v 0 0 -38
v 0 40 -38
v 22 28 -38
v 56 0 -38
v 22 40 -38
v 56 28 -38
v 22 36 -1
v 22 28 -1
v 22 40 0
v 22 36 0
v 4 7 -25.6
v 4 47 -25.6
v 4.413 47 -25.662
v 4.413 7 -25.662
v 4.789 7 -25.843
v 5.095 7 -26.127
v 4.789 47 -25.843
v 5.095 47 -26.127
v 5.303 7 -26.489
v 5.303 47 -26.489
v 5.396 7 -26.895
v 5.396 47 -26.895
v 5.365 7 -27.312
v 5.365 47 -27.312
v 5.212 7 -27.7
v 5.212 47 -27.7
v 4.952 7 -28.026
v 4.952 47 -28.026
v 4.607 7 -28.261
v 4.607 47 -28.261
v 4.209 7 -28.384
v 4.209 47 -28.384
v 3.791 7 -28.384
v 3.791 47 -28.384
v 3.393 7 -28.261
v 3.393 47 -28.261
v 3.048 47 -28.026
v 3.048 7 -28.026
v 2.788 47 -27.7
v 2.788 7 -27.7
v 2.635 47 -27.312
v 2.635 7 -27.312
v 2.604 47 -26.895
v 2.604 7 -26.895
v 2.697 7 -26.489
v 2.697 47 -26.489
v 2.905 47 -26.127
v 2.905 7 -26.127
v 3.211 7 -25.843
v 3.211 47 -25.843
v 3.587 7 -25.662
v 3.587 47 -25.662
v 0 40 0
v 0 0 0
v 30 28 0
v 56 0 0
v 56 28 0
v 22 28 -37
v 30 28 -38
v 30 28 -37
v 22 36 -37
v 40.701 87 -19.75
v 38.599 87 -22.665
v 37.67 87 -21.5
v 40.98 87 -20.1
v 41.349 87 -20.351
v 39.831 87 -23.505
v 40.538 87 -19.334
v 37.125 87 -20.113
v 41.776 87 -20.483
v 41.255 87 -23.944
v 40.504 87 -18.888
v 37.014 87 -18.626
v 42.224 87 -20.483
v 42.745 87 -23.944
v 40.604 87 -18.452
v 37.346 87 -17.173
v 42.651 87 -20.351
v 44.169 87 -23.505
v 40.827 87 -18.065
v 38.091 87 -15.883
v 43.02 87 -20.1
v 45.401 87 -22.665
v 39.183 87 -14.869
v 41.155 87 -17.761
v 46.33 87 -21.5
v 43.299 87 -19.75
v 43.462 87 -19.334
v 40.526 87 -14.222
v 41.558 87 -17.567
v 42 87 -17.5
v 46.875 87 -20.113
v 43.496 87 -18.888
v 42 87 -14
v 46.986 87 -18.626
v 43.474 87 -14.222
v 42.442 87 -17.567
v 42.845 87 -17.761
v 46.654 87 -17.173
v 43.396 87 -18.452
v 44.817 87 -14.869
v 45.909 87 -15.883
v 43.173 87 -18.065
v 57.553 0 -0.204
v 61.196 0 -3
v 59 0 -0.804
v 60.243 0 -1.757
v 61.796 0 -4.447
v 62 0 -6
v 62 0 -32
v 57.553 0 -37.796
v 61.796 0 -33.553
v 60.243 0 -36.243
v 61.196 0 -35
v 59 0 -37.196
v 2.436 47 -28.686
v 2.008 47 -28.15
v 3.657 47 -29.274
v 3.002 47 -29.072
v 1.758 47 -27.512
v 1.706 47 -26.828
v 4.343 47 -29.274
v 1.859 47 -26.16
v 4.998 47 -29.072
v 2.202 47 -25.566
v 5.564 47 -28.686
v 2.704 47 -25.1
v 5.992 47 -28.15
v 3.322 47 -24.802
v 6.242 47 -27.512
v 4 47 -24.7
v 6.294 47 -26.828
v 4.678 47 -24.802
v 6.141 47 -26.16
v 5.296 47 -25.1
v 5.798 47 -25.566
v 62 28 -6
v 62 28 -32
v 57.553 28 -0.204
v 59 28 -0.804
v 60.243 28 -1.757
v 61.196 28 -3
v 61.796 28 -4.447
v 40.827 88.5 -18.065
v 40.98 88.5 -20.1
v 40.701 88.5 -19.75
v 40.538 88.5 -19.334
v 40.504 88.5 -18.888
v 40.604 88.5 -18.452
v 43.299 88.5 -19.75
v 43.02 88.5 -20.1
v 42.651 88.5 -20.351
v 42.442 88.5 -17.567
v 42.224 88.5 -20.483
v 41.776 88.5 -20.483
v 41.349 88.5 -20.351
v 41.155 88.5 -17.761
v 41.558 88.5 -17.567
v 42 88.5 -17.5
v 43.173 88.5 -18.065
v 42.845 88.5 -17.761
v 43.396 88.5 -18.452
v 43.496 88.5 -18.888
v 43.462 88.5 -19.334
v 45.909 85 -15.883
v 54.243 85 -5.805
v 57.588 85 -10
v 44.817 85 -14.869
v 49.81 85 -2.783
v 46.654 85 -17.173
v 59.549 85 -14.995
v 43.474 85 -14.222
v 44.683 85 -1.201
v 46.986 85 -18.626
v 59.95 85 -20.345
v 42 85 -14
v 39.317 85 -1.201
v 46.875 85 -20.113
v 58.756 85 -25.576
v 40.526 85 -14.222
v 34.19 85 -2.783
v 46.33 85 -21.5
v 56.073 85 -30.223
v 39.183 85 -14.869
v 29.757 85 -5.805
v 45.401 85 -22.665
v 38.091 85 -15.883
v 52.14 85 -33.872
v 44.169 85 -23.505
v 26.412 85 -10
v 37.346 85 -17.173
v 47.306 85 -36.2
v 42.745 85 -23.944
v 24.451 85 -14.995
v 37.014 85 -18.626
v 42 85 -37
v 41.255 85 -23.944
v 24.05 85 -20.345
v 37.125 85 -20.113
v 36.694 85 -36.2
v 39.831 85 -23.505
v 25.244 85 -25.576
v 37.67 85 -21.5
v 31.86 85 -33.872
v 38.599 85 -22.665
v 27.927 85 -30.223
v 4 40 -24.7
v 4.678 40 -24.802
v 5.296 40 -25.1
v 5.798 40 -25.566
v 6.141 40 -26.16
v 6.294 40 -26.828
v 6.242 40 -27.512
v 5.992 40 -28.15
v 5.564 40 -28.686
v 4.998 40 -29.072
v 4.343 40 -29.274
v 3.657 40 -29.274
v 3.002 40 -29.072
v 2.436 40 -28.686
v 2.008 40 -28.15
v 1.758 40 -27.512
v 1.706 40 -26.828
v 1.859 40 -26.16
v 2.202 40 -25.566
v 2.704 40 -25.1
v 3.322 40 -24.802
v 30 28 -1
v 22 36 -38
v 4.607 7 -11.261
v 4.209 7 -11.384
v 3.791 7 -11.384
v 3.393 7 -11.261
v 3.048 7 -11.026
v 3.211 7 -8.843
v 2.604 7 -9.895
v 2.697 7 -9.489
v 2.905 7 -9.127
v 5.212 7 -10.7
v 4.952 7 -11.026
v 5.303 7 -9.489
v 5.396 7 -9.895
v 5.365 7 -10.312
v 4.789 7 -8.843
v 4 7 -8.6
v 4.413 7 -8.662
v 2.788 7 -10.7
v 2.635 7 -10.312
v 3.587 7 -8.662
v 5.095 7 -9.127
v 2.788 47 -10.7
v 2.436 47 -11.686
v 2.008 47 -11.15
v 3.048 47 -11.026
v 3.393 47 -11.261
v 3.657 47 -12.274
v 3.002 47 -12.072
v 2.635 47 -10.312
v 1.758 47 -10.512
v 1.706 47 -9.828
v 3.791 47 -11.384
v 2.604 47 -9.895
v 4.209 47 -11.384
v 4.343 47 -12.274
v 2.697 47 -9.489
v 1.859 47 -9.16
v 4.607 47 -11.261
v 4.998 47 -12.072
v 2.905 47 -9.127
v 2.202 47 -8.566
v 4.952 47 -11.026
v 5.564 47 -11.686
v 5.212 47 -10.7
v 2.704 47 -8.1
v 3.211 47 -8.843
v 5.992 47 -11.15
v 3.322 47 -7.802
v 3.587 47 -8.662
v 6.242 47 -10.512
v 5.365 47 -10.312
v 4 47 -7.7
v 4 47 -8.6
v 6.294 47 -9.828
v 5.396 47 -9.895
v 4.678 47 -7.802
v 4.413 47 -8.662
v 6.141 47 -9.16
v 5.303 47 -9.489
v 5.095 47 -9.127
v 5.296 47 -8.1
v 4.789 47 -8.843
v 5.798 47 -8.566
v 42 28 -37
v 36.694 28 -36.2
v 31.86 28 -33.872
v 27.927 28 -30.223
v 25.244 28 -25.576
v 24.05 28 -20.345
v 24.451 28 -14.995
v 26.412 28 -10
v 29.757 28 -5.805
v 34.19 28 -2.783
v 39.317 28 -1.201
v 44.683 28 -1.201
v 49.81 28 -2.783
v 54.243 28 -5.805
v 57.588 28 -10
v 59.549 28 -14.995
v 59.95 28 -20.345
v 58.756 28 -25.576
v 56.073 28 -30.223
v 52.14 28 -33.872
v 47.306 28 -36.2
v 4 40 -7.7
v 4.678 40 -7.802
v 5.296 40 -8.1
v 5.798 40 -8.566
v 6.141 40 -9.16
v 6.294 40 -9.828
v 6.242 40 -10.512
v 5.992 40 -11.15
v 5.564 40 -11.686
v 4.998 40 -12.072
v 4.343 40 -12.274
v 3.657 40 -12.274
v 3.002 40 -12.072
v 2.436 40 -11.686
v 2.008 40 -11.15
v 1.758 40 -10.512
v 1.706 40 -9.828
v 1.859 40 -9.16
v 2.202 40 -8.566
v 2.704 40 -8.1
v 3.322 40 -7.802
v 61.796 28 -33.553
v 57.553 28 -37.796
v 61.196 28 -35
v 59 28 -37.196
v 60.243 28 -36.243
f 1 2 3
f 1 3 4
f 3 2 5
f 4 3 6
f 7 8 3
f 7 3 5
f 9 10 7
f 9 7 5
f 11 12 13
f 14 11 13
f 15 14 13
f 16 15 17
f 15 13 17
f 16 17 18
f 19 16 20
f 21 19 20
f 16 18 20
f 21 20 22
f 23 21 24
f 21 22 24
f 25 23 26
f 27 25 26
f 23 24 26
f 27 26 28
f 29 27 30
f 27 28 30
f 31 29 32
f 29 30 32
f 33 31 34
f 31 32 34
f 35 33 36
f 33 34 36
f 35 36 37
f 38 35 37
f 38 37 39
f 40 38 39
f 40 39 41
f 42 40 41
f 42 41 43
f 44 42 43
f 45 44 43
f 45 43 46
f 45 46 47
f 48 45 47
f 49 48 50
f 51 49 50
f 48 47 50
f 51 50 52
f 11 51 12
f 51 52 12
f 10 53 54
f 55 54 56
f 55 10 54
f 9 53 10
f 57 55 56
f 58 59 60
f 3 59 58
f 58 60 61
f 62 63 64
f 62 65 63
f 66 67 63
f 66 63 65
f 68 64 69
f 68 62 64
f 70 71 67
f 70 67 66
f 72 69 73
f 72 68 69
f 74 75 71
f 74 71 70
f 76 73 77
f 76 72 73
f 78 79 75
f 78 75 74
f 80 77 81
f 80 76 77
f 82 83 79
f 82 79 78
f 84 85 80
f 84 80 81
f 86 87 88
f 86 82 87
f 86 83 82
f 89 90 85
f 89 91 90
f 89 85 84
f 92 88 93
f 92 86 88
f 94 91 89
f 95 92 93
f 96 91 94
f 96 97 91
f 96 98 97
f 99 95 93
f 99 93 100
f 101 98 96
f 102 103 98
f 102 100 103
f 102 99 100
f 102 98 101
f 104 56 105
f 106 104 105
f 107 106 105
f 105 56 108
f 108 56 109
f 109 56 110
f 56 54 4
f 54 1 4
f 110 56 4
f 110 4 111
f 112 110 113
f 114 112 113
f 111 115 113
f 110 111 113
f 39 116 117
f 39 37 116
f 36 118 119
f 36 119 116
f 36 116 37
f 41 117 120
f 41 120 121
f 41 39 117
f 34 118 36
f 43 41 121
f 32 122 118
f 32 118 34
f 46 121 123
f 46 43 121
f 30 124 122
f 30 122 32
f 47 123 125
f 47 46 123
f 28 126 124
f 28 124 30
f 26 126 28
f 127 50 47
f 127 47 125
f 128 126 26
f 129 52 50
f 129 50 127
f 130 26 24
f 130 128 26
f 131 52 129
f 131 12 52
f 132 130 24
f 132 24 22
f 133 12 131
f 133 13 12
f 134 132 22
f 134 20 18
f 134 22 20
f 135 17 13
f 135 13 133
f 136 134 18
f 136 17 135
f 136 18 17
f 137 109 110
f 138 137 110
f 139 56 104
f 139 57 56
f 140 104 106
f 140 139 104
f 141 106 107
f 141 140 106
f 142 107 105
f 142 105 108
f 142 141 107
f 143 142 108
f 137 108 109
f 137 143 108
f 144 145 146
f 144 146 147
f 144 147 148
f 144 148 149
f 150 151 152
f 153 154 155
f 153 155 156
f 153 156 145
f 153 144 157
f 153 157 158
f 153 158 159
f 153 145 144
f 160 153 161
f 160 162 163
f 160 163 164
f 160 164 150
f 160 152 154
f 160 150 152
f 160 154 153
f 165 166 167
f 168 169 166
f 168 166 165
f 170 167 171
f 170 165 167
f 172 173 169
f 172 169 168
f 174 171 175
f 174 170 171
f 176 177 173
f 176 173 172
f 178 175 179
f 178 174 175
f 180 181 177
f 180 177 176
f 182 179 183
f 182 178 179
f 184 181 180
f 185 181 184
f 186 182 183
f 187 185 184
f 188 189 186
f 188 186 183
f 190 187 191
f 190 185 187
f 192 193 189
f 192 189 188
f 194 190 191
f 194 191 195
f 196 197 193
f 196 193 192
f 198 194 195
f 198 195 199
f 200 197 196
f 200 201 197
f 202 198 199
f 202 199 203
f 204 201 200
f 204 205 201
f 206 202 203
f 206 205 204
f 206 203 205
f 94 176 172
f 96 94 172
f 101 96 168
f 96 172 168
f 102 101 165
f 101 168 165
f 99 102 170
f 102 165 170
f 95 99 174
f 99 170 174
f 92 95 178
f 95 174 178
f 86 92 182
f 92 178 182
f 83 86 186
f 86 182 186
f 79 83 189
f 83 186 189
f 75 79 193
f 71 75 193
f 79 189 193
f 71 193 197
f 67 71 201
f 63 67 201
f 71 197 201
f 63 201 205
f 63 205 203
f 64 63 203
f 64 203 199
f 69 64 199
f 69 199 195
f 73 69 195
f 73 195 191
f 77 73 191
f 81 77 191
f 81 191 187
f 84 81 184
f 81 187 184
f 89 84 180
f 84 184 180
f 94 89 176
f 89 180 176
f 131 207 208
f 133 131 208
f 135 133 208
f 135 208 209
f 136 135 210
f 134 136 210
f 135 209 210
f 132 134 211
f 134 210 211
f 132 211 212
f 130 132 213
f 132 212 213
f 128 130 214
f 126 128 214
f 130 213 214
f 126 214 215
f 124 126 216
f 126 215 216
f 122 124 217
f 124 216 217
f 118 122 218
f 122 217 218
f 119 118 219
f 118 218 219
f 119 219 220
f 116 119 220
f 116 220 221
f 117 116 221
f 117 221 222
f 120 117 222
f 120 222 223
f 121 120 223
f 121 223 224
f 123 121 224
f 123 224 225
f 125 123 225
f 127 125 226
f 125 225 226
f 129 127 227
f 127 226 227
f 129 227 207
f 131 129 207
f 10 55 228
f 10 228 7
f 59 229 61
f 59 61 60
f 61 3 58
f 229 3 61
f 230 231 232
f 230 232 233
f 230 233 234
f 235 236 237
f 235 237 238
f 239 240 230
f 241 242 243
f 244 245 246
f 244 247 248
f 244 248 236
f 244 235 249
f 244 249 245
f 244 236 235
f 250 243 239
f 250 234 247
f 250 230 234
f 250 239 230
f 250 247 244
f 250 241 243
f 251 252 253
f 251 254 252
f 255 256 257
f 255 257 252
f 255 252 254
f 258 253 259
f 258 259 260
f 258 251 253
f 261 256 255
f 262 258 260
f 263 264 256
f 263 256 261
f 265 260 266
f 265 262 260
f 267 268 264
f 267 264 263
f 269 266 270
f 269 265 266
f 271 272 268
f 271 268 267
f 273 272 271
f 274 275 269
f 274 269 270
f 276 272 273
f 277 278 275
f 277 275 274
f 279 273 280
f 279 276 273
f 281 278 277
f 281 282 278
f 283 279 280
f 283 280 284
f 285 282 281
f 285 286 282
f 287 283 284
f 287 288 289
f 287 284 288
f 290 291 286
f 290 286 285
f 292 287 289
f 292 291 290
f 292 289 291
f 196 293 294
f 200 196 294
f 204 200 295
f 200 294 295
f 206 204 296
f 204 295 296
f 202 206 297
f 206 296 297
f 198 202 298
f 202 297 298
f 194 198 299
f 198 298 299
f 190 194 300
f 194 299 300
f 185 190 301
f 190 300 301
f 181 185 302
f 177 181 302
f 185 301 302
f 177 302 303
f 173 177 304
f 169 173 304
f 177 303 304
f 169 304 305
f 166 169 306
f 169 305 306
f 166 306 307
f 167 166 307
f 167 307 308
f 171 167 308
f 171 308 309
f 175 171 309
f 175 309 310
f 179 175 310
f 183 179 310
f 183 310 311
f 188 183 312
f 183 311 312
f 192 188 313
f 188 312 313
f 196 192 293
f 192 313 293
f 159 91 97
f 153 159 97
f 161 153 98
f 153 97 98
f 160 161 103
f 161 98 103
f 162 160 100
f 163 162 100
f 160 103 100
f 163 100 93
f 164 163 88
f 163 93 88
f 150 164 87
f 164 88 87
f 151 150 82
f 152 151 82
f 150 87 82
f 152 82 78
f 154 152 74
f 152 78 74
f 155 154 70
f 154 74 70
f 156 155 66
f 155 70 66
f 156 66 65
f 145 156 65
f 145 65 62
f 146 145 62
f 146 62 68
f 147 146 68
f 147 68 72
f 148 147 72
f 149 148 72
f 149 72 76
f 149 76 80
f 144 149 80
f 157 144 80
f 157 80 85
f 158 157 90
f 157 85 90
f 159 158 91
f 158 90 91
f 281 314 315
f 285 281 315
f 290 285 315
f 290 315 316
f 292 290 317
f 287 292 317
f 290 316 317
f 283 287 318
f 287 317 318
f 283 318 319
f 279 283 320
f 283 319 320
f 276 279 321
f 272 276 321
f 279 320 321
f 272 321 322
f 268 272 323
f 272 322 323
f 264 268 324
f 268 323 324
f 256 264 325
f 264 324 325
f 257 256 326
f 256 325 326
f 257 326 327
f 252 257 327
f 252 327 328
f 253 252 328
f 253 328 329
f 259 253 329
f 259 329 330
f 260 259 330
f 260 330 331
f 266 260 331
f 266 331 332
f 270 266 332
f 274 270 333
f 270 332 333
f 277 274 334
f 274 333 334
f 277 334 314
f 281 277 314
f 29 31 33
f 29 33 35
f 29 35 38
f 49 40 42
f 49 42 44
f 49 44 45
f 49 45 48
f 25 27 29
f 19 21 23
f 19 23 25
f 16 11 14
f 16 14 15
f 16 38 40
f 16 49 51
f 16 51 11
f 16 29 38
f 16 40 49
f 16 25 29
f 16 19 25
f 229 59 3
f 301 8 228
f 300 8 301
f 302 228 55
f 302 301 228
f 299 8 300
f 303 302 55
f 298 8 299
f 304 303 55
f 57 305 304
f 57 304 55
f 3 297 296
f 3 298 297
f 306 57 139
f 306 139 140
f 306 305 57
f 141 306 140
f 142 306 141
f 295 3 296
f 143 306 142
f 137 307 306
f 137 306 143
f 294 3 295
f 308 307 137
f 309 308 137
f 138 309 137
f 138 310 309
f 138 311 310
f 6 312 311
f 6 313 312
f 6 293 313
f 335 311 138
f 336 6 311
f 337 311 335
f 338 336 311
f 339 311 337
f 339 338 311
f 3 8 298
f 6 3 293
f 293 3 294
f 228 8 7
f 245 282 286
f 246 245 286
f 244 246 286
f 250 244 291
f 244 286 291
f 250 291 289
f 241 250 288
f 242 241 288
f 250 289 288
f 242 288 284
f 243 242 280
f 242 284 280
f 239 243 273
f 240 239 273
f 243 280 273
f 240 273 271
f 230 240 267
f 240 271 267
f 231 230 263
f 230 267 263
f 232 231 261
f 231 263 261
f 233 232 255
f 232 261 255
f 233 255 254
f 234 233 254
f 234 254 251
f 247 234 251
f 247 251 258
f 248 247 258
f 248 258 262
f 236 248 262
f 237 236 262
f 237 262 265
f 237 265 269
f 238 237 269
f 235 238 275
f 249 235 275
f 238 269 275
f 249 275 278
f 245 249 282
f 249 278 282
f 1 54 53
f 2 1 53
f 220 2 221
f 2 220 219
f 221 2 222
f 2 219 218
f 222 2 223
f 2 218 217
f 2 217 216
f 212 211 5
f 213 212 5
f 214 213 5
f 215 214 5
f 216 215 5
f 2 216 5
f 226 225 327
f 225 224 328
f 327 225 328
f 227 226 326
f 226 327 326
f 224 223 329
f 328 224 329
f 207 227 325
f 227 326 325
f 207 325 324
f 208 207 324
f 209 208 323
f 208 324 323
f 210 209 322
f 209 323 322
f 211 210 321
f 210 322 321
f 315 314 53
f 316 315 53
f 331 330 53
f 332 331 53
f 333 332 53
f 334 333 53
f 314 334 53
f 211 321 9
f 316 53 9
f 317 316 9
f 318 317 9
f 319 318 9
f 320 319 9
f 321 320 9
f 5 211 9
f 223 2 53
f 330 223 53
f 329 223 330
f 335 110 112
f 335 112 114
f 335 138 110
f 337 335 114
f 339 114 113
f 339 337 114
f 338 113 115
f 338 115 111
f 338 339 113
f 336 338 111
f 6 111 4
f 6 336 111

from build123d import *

# Parameters (mm, degrees)
ESQUISSE1_W             = 62
ESQUISSE1_H             = 38
BOSS_EXTRU_1_DEPTH      = 28
CONG_1_R                = 6
ESQUISSE3_W             = 22
ESQUISSE3_H             = 12
BOSS_EXTRU_2_DEPTH      = 38
ESQUISSE4_R             = 2.3
BOSS_EXTRU_3_DEPTH      = 7
ESQUISSE5_R             = 1.4
ENL_V_MAT_EXTRU_1_DEPTH = 40
ESQUISSE6_R             = 18
BOSS_EXTRU_4_DEPTH      = 57
ESQUISSE7_R             = 5
BOSS_EXTRU_5_DEPTH      = 2
BOSS_EXTRU_6_DEPTH      = 1
BOSS_EXTRU_7_DEPTH      = 1
ESQUISSE10_R            = 1.5
BOSS_EXTRU_8_DEPTH      = 1.5


with BuildPart() as part:
    # Esquisse1 → Boss.-Extru.1 (new body)
    with BuildSketch(Plane(origin=(0, 0, 0), x_dir=(1, 0, 0), z_dir=(0, 1, 0))):
        with Locations((31, 19)):
            Rectangle(ESQUISSE1_W, ESQUISSE1_H)
    extrude(amount=BOSS_EXTRU_1_DEPTH)

    # Congé1
    cong_1_edges = [part.edges().sort_by_distance(p)[0] for p in [
        (62, 14, -38),
        (62, 14, 0),
    ]]
    fillet(cong_1_edges, radius=CONG_1_R)

    # Esquisse3 → Boss.-Extru.2 (add)
    with BuildSketch(Plane.XY):
        with Locations((11, 34)):
            Rectangle(ESQUISSE3_W, ESQUISSE3_H)
    extrude(amount=-BOSS_EXTRU_2_DEPTH)

    # Esquisse4 → Boss.-Extru.3 (add)
    with BuildSketch(Plane(origin=(0, 40, 0), x_dir=(1, 0, 0), z_dir=(0, 1, 0))):
        with Locations((4, 10)):
            Circle(ESQUISSE4_R)
        with Locations((4, 27)):
            Circle(ESQUISSE4_R)
    extrude(amount=BOSS_EXTRU_3_DEPTH)

    # Esquisse5 → Enlèv. mat.-Extru.1 (cut)
    with BuildSketch(Plane(origin=(0, 47, 0), x_dir=(1, 0, 0), z_dir=(0, 1, 0))):
        with Locations((4, 10)):
            Circle(ESQUISSE5_R)
        with Locations((4, 27)):
            Circle(ESQUISSE5_R)
    extrude(amount=-ENL_V_MAT_EXTRU_1_DEPTH, mode=Mode.SUBTRACT)

    # Esquisse6 → Boss.-Extru.4 (add)
    with BuildSketch(Plane(origin=(0, 28, 0), x_dir=(1, 0, 0), z_dir=(0, 1, 0))):
        with Locations((42, 19)):
            Circle(ESQUISSE6_R)
    extrude(amount=BOSS_EXTRU_4_DEPTH)

    # Esquisse7 → Boss.-Extru.5 (add)
    with BuildSketch(Plane(origin=(0, 85, 0), x_dir=(1, 0, 0), z_dir=(0, 1, 0))):
        with Locations((42, 19)):
            Circle(ESQUISSE7_R)
    extrude(amount=BOSS_EXTRU_5_DEPTH)

    # Esquisse8 → Boss.-Extru.6 (add)
    with BuildSketch(Plane.XY):
        Polygon((22, 28), (30, 28), (22, 36), align=None)
    extrude(amount=-BOSS_EXTRU_6_DEPTH)

    # Esquisse10 → Boss.-Extru.8 (add)
    with BuildSketch(Plane(origin=(0, 87, 0), x_dir=(1, 0, 0), z_dir=(0, 1, 0))):
        with Locations((42, 19)):
            Circle(ESQUISSE10_R)
    extrude(amount=BOSS_EXTRU_8_DEPTH)


with BuildPart() as body_2:
    # Esquisse9 → Boss.-Extru.7 (new body)
    with BuildSketch(Plane(origin=(0, 0, -38), x_dir=(-1, 0, 0), z_dir=(0, 0, -1))):
        Polygon((-22, 28), (-22, 36), (-30, 28), align=None)
    extrude(amount=-BOSS_EXTRU_7_DEPTH)


solid = Compound([part.part, body_2.part])
